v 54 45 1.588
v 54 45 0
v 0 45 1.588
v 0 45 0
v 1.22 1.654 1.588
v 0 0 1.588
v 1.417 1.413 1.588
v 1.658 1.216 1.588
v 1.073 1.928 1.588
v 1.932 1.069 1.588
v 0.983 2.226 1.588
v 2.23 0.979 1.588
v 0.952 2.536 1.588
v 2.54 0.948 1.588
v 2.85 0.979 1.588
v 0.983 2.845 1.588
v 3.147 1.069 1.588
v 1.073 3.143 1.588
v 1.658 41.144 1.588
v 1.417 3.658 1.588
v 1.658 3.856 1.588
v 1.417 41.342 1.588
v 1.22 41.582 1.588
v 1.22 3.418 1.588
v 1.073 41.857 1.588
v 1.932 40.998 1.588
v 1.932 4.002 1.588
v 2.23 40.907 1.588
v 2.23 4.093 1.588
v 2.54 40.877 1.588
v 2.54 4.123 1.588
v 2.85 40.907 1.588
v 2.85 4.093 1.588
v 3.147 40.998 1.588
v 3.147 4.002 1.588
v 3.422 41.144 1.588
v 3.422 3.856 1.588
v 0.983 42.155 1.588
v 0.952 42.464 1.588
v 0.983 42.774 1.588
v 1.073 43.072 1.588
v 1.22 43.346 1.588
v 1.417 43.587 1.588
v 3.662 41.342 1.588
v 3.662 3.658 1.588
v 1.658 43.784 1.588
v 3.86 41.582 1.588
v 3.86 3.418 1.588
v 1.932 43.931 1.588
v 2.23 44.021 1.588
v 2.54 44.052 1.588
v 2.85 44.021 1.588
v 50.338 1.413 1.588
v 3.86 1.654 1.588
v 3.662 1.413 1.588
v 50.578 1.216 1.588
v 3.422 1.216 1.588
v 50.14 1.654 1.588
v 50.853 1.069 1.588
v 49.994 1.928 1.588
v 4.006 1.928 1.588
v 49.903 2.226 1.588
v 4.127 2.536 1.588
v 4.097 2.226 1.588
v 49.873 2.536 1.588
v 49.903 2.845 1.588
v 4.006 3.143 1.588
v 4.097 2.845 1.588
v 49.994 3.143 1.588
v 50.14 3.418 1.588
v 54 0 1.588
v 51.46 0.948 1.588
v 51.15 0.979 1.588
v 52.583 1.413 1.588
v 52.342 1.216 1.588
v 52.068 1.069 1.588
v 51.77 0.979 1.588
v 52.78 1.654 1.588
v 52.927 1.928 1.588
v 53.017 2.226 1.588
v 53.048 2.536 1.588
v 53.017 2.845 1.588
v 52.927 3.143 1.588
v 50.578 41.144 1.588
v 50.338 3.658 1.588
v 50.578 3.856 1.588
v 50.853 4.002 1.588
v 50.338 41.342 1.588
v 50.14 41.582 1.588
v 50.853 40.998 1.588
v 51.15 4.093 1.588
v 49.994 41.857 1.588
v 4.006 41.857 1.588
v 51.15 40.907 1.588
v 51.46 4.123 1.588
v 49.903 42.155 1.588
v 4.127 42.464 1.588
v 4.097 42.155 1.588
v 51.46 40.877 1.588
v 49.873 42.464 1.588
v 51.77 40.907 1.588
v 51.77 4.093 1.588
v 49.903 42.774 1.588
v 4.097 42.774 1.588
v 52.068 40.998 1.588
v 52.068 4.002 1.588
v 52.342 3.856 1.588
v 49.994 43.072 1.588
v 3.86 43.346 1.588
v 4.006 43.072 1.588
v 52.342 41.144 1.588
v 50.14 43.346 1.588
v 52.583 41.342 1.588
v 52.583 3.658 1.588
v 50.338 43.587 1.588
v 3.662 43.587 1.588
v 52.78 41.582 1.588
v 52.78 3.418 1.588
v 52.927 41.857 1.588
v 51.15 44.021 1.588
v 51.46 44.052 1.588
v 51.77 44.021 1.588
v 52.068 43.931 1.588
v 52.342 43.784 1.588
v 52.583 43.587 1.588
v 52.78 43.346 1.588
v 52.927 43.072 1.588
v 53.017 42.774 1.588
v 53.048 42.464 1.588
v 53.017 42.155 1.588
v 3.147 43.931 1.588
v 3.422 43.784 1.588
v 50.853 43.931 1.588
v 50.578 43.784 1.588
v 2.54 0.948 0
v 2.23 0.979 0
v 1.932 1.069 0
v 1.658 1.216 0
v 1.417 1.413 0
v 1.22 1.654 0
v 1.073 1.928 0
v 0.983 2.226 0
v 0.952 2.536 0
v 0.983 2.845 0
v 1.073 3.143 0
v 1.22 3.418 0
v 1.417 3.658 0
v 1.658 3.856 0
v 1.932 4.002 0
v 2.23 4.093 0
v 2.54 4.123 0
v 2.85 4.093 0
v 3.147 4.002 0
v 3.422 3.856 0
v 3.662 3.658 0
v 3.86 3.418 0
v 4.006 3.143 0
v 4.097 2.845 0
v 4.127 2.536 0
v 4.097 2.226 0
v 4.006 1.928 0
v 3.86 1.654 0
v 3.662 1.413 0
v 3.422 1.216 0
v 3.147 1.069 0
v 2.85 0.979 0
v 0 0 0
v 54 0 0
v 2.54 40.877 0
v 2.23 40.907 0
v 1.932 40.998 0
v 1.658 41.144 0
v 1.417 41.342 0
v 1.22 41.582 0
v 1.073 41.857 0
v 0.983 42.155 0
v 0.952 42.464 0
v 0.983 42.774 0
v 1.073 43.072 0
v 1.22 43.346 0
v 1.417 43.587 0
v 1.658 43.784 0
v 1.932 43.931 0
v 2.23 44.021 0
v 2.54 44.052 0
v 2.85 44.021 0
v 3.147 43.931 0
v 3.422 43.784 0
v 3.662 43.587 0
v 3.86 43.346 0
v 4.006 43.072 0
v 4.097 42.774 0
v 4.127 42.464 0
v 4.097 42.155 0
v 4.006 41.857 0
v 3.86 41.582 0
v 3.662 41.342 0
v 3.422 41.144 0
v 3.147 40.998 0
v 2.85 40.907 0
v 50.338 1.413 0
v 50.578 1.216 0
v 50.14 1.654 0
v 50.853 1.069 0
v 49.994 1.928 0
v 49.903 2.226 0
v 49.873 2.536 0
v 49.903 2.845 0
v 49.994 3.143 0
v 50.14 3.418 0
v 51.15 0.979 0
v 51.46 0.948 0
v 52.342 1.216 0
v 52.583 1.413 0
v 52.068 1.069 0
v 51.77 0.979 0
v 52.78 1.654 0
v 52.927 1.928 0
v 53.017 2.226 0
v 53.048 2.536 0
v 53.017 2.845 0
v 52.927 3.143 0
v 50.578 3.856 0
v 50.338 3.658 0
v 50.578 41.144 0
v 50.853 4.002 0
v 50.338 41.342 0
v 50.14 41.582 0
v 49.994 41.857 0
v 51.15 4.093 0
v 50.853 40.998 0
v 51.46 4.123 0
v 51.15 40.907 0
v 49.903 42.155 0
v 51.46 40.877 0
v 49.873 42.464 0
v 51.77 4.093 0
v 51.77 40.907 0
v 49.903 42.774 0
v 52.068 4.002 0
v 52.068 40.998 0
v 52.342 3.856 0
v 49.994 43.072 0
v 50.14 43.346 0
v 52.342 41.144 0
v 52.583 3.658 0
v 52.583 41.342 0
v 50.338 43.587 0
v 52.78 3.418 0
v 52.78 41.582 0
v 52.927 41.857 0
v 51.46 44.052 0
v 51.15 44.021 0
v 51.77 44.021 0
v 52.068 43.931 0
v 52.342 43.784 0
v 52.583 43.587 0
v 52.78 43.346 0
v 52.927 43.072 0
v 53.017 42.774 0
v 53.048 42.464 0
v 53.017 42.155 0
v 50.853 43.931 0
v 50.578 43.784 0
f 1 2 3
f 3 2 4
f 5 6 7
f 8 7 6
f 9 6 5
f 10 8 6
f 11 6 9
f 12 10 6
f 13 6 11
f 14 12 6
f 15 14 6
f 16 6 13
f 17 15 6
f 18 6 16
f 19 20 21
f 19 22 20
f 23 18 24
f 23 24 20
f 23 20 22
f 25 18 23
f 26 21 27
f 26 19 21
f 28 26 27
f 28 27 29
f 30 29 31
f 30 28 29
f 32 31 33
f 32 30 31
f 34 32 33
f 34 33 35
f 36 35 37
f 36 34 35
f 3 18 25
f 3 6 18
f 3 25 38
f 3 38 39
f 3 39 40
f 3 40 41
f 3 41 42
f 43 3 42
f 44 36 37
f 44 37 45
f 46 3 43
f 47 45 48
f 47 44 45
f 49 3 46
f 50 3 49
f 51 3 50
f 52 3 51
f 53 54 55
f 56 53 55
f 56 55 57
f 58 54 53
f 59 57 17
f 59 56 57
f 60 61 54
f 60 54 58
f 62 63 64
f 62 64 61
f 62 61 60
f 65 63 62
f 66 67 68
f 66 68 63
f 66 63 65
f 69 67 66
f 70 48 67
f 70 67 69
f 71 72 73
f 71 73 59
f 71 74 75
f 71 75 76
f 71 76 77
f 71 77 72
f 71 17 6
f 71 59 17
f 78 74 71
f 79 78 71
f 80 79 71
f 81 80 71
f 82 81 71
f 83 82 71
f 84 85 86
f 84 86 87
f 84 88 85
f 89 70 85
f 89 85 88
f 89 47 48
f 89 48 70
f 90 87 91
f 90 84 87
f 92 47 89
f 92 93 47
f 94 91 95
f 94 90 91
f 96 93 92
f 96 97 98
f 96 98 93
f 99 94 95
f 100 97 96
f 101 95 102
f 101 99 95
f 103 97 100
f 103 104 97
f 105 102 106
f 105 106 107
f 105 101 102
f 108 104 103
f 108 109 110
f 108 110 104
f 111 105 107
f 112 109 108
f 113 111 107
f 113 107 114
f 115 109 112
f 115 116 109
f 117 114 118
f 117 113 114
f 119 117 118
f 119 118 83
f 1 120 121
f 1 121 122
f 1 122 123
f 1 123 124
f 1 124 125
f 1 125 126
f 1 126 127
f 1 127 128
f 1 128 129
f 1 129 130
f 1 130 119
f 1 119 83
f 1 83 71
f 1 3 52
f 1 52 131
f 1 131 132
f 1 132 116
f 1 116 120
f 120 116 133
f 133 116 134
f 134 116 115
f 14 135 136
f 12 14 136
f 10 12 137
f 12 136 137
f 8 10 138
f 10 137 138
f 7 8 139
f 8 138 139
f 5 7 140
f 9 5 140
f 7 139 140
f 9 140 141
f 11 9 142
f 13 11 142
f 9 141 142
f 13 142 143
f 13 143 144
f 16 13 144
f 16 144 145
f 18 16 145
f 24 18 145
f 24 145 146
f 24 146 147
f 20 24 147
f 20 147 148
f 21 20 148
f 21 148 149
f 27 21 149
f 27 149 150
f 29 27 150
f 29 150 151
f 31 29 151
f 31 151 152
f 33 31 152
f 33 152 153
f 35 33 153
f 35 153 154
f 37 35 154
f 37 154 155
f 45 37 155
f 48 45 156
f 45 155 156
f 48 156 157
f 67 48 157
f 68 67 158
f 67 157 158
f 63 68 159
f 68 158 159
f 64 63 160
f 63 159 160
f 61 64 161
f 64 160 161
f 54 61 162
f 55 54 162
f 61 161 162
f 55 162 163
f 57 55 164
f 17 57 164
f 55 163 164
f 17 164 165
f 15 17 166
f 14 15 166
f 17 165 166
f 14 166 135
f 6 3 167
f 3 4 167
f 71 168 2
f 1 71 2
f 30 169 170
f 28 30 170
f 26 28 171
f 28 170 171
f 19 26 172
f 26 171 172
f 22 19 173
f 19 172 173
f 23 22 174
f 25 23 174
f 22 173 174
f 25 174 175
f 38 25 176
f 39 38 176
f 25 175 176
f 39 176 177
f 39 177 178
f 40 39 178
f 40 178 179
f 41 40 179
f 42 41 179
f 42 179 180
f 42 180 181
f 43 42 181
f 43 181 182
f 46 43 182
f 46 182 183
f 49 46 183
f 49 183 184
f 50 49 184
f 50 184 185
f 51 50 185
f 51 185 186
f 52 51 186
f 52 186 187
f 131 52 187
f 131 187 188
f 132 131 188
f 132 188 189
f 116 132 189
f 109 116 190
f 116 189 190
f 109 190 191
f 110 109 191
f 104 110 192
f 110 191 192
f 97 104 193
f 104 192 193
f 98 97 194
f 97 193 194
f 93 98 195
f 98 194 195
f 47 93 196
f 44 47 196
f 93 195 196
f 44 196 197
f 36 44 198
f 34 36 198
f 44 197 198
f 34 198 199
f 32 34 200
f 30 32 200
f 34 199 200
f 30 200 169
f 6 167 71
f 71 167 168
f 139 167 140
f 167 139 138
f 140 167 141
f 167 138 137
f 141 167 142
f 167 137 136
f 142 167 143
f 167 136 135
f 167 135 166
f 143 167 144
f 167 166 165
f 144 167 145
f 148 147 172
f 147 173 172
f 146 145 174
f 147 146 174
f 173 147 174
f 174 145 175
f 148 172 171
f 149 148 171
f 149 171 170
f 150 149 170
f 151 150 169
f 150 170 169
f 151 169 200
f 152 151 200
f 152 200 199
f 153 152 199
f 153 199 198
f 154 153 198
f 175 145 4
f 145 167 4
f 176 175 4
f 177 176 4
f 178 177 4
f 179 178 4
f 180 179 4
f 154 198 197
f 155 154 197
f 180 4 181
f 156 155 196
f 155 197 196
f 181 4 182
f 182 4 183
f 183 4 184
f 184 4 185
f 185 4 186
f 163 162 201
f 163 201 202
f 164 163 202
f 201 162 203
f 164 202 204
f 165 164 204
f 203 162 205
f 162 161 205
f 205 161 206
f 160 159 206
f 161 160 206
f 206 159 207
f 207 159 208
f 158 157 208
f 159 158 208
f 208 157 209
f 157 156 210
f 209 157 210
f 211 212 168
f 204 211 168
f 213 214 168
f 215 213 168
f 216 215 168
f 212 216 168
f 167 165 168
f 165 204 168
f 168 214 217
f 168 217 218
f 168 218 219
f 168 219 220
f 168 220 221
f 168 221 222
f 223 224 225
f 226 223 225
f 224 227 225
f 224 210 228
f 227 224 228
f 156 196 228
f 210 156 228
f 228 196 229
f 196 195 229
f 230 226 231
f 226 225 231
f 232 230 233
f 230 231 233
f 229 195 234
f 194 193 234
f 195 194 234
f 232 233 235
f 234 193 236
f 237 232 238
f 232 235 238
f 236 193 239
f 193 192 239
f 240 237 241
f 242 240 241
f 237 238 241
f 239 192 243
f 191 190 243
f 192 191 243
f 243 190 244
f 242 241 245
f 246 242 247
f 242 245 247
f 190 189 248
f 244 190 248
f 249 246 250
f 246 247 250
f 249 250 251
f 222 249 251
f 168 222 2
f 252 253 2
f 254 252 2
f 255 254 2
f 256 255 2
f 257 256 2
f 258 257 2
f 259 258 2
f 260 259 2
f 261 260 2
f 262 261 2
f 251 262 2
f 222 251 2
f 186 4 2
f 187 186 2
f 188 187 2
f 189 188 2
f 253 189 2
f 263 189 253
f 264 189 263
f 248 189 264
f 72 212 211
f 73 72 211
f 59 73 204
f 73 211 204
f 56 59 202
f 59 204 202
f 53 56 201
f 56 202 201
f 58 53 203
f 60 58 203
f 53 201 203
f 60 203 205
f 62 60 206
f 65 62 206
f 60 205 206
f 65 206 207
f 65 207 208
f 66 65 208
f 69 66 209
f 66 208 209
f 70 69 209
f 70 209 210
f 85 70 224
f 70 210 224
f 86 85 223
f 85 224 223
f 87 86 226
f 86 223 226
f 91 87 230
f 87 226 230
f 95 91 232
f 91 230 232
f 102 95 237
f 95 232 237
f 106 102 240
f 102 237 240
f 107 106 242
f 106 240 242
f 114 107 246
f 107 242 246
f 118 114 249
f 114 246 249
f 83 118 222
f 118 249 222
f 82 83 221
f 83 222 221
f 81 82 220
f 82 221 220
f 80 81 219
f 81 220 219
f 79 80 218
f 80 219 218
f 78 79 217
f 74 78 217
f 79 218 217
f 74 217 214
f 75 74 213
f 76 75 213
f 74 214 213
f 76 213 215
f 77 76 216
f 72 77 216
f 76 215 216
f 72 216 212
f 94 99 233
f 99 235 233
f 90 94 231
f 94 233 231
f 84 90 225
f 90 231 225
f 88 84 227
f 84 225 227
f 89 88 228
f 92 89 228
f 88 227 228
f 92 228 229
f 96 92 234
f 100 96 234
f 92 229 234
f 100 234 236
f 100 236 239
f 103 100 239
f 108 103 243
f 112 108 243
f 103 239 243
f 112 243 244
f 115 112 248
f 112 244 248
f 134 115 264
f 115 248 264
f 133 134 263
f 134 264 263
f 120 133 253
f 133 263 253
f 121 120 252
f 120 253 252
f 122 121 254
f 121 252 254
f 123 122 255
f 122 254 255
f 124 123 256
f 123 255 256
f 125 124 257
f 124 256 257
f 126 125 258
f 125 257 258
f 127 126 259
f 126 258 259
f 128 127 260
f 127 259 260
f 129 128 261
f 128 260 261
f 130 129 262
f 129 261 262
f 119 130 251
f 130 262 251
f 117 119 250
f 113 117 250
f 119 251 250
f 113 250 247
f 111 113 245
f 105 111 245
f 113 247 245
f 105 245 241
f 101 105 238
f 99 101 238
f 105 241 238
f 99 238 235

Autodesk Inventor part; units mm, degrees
ref_plane "YZ Plane" through (0, 0, 0) normal (1, 0, 0) x (0, 1, 0)
ref_plane "XZ Plane" through (0, 0, 0) normal (0, 1, 0) x (-1, 0, 0)
ref_plane "XY Plane" through (0, 0, 0) normal (0, 0, 1) x (1, 0, 0)
sketch "Sketch1" plane through (0, 0, 0) normal (0, 0, 1) x (1, 0, 0)
  line L0 (0, 0) -> (54, 0)
  line L1 (54, 0) -> (54, 45)
  line L2 (54, 45) -> (0, 45)
  line L3 (0, 45) -> (0, 0)
  dimension "d0" = 54
  dimension "d1" = 45
extrude "Extrusion1" add sketch "Sketch1" along normal blind 1.5875
sketch "Sketch2" plane through (0, 0, 1.5875) normal (0, 0, 1) x (1, 0, 0)
  line L0 (2.5398, 42.4644) -> (2.5398, 2.5356) construction
  line L1 (2.5398, 2.5356) -> (51.4602, 2.5356) construction
  line L2 (51.4602, 2.5356) -> (51.4602, 42.4644) construction
  line L3 (51.4602, 42.4644) -> (2.5398, 42.4644) construction
  line L4 (27, 2.5356) -> (27, 42.4644) construction
  line L5 (2.5398, 22.5) -> (51.4602, 22.5) construction
  line L6 (54, 0) -> (54, 45) construction
  line L7 (54, 45) -> (0, 45) construction
  line L8 (0, 45) -> (0, 0) construction
  line L9 (0, 0) -> (54, 0) construction
  line L10 (27, 0) -> (27, 45) construction
  line L11 (0, 22.5) -> (54, 22.5) construction
  dimension "d4" = 39.9288
  dimension "d5" = 48.9204
hole "Hole1" at (2.5398, 2.5356, 1.5875) at (2.5398, 42.4644, 1.5875) at (51.4602, 42.4644, 1.5875) at (51.4602, 2.5356, 1.5875) direction (0, 0, -1) diameter 3.175 end through all
properties part number "Board_Main"
